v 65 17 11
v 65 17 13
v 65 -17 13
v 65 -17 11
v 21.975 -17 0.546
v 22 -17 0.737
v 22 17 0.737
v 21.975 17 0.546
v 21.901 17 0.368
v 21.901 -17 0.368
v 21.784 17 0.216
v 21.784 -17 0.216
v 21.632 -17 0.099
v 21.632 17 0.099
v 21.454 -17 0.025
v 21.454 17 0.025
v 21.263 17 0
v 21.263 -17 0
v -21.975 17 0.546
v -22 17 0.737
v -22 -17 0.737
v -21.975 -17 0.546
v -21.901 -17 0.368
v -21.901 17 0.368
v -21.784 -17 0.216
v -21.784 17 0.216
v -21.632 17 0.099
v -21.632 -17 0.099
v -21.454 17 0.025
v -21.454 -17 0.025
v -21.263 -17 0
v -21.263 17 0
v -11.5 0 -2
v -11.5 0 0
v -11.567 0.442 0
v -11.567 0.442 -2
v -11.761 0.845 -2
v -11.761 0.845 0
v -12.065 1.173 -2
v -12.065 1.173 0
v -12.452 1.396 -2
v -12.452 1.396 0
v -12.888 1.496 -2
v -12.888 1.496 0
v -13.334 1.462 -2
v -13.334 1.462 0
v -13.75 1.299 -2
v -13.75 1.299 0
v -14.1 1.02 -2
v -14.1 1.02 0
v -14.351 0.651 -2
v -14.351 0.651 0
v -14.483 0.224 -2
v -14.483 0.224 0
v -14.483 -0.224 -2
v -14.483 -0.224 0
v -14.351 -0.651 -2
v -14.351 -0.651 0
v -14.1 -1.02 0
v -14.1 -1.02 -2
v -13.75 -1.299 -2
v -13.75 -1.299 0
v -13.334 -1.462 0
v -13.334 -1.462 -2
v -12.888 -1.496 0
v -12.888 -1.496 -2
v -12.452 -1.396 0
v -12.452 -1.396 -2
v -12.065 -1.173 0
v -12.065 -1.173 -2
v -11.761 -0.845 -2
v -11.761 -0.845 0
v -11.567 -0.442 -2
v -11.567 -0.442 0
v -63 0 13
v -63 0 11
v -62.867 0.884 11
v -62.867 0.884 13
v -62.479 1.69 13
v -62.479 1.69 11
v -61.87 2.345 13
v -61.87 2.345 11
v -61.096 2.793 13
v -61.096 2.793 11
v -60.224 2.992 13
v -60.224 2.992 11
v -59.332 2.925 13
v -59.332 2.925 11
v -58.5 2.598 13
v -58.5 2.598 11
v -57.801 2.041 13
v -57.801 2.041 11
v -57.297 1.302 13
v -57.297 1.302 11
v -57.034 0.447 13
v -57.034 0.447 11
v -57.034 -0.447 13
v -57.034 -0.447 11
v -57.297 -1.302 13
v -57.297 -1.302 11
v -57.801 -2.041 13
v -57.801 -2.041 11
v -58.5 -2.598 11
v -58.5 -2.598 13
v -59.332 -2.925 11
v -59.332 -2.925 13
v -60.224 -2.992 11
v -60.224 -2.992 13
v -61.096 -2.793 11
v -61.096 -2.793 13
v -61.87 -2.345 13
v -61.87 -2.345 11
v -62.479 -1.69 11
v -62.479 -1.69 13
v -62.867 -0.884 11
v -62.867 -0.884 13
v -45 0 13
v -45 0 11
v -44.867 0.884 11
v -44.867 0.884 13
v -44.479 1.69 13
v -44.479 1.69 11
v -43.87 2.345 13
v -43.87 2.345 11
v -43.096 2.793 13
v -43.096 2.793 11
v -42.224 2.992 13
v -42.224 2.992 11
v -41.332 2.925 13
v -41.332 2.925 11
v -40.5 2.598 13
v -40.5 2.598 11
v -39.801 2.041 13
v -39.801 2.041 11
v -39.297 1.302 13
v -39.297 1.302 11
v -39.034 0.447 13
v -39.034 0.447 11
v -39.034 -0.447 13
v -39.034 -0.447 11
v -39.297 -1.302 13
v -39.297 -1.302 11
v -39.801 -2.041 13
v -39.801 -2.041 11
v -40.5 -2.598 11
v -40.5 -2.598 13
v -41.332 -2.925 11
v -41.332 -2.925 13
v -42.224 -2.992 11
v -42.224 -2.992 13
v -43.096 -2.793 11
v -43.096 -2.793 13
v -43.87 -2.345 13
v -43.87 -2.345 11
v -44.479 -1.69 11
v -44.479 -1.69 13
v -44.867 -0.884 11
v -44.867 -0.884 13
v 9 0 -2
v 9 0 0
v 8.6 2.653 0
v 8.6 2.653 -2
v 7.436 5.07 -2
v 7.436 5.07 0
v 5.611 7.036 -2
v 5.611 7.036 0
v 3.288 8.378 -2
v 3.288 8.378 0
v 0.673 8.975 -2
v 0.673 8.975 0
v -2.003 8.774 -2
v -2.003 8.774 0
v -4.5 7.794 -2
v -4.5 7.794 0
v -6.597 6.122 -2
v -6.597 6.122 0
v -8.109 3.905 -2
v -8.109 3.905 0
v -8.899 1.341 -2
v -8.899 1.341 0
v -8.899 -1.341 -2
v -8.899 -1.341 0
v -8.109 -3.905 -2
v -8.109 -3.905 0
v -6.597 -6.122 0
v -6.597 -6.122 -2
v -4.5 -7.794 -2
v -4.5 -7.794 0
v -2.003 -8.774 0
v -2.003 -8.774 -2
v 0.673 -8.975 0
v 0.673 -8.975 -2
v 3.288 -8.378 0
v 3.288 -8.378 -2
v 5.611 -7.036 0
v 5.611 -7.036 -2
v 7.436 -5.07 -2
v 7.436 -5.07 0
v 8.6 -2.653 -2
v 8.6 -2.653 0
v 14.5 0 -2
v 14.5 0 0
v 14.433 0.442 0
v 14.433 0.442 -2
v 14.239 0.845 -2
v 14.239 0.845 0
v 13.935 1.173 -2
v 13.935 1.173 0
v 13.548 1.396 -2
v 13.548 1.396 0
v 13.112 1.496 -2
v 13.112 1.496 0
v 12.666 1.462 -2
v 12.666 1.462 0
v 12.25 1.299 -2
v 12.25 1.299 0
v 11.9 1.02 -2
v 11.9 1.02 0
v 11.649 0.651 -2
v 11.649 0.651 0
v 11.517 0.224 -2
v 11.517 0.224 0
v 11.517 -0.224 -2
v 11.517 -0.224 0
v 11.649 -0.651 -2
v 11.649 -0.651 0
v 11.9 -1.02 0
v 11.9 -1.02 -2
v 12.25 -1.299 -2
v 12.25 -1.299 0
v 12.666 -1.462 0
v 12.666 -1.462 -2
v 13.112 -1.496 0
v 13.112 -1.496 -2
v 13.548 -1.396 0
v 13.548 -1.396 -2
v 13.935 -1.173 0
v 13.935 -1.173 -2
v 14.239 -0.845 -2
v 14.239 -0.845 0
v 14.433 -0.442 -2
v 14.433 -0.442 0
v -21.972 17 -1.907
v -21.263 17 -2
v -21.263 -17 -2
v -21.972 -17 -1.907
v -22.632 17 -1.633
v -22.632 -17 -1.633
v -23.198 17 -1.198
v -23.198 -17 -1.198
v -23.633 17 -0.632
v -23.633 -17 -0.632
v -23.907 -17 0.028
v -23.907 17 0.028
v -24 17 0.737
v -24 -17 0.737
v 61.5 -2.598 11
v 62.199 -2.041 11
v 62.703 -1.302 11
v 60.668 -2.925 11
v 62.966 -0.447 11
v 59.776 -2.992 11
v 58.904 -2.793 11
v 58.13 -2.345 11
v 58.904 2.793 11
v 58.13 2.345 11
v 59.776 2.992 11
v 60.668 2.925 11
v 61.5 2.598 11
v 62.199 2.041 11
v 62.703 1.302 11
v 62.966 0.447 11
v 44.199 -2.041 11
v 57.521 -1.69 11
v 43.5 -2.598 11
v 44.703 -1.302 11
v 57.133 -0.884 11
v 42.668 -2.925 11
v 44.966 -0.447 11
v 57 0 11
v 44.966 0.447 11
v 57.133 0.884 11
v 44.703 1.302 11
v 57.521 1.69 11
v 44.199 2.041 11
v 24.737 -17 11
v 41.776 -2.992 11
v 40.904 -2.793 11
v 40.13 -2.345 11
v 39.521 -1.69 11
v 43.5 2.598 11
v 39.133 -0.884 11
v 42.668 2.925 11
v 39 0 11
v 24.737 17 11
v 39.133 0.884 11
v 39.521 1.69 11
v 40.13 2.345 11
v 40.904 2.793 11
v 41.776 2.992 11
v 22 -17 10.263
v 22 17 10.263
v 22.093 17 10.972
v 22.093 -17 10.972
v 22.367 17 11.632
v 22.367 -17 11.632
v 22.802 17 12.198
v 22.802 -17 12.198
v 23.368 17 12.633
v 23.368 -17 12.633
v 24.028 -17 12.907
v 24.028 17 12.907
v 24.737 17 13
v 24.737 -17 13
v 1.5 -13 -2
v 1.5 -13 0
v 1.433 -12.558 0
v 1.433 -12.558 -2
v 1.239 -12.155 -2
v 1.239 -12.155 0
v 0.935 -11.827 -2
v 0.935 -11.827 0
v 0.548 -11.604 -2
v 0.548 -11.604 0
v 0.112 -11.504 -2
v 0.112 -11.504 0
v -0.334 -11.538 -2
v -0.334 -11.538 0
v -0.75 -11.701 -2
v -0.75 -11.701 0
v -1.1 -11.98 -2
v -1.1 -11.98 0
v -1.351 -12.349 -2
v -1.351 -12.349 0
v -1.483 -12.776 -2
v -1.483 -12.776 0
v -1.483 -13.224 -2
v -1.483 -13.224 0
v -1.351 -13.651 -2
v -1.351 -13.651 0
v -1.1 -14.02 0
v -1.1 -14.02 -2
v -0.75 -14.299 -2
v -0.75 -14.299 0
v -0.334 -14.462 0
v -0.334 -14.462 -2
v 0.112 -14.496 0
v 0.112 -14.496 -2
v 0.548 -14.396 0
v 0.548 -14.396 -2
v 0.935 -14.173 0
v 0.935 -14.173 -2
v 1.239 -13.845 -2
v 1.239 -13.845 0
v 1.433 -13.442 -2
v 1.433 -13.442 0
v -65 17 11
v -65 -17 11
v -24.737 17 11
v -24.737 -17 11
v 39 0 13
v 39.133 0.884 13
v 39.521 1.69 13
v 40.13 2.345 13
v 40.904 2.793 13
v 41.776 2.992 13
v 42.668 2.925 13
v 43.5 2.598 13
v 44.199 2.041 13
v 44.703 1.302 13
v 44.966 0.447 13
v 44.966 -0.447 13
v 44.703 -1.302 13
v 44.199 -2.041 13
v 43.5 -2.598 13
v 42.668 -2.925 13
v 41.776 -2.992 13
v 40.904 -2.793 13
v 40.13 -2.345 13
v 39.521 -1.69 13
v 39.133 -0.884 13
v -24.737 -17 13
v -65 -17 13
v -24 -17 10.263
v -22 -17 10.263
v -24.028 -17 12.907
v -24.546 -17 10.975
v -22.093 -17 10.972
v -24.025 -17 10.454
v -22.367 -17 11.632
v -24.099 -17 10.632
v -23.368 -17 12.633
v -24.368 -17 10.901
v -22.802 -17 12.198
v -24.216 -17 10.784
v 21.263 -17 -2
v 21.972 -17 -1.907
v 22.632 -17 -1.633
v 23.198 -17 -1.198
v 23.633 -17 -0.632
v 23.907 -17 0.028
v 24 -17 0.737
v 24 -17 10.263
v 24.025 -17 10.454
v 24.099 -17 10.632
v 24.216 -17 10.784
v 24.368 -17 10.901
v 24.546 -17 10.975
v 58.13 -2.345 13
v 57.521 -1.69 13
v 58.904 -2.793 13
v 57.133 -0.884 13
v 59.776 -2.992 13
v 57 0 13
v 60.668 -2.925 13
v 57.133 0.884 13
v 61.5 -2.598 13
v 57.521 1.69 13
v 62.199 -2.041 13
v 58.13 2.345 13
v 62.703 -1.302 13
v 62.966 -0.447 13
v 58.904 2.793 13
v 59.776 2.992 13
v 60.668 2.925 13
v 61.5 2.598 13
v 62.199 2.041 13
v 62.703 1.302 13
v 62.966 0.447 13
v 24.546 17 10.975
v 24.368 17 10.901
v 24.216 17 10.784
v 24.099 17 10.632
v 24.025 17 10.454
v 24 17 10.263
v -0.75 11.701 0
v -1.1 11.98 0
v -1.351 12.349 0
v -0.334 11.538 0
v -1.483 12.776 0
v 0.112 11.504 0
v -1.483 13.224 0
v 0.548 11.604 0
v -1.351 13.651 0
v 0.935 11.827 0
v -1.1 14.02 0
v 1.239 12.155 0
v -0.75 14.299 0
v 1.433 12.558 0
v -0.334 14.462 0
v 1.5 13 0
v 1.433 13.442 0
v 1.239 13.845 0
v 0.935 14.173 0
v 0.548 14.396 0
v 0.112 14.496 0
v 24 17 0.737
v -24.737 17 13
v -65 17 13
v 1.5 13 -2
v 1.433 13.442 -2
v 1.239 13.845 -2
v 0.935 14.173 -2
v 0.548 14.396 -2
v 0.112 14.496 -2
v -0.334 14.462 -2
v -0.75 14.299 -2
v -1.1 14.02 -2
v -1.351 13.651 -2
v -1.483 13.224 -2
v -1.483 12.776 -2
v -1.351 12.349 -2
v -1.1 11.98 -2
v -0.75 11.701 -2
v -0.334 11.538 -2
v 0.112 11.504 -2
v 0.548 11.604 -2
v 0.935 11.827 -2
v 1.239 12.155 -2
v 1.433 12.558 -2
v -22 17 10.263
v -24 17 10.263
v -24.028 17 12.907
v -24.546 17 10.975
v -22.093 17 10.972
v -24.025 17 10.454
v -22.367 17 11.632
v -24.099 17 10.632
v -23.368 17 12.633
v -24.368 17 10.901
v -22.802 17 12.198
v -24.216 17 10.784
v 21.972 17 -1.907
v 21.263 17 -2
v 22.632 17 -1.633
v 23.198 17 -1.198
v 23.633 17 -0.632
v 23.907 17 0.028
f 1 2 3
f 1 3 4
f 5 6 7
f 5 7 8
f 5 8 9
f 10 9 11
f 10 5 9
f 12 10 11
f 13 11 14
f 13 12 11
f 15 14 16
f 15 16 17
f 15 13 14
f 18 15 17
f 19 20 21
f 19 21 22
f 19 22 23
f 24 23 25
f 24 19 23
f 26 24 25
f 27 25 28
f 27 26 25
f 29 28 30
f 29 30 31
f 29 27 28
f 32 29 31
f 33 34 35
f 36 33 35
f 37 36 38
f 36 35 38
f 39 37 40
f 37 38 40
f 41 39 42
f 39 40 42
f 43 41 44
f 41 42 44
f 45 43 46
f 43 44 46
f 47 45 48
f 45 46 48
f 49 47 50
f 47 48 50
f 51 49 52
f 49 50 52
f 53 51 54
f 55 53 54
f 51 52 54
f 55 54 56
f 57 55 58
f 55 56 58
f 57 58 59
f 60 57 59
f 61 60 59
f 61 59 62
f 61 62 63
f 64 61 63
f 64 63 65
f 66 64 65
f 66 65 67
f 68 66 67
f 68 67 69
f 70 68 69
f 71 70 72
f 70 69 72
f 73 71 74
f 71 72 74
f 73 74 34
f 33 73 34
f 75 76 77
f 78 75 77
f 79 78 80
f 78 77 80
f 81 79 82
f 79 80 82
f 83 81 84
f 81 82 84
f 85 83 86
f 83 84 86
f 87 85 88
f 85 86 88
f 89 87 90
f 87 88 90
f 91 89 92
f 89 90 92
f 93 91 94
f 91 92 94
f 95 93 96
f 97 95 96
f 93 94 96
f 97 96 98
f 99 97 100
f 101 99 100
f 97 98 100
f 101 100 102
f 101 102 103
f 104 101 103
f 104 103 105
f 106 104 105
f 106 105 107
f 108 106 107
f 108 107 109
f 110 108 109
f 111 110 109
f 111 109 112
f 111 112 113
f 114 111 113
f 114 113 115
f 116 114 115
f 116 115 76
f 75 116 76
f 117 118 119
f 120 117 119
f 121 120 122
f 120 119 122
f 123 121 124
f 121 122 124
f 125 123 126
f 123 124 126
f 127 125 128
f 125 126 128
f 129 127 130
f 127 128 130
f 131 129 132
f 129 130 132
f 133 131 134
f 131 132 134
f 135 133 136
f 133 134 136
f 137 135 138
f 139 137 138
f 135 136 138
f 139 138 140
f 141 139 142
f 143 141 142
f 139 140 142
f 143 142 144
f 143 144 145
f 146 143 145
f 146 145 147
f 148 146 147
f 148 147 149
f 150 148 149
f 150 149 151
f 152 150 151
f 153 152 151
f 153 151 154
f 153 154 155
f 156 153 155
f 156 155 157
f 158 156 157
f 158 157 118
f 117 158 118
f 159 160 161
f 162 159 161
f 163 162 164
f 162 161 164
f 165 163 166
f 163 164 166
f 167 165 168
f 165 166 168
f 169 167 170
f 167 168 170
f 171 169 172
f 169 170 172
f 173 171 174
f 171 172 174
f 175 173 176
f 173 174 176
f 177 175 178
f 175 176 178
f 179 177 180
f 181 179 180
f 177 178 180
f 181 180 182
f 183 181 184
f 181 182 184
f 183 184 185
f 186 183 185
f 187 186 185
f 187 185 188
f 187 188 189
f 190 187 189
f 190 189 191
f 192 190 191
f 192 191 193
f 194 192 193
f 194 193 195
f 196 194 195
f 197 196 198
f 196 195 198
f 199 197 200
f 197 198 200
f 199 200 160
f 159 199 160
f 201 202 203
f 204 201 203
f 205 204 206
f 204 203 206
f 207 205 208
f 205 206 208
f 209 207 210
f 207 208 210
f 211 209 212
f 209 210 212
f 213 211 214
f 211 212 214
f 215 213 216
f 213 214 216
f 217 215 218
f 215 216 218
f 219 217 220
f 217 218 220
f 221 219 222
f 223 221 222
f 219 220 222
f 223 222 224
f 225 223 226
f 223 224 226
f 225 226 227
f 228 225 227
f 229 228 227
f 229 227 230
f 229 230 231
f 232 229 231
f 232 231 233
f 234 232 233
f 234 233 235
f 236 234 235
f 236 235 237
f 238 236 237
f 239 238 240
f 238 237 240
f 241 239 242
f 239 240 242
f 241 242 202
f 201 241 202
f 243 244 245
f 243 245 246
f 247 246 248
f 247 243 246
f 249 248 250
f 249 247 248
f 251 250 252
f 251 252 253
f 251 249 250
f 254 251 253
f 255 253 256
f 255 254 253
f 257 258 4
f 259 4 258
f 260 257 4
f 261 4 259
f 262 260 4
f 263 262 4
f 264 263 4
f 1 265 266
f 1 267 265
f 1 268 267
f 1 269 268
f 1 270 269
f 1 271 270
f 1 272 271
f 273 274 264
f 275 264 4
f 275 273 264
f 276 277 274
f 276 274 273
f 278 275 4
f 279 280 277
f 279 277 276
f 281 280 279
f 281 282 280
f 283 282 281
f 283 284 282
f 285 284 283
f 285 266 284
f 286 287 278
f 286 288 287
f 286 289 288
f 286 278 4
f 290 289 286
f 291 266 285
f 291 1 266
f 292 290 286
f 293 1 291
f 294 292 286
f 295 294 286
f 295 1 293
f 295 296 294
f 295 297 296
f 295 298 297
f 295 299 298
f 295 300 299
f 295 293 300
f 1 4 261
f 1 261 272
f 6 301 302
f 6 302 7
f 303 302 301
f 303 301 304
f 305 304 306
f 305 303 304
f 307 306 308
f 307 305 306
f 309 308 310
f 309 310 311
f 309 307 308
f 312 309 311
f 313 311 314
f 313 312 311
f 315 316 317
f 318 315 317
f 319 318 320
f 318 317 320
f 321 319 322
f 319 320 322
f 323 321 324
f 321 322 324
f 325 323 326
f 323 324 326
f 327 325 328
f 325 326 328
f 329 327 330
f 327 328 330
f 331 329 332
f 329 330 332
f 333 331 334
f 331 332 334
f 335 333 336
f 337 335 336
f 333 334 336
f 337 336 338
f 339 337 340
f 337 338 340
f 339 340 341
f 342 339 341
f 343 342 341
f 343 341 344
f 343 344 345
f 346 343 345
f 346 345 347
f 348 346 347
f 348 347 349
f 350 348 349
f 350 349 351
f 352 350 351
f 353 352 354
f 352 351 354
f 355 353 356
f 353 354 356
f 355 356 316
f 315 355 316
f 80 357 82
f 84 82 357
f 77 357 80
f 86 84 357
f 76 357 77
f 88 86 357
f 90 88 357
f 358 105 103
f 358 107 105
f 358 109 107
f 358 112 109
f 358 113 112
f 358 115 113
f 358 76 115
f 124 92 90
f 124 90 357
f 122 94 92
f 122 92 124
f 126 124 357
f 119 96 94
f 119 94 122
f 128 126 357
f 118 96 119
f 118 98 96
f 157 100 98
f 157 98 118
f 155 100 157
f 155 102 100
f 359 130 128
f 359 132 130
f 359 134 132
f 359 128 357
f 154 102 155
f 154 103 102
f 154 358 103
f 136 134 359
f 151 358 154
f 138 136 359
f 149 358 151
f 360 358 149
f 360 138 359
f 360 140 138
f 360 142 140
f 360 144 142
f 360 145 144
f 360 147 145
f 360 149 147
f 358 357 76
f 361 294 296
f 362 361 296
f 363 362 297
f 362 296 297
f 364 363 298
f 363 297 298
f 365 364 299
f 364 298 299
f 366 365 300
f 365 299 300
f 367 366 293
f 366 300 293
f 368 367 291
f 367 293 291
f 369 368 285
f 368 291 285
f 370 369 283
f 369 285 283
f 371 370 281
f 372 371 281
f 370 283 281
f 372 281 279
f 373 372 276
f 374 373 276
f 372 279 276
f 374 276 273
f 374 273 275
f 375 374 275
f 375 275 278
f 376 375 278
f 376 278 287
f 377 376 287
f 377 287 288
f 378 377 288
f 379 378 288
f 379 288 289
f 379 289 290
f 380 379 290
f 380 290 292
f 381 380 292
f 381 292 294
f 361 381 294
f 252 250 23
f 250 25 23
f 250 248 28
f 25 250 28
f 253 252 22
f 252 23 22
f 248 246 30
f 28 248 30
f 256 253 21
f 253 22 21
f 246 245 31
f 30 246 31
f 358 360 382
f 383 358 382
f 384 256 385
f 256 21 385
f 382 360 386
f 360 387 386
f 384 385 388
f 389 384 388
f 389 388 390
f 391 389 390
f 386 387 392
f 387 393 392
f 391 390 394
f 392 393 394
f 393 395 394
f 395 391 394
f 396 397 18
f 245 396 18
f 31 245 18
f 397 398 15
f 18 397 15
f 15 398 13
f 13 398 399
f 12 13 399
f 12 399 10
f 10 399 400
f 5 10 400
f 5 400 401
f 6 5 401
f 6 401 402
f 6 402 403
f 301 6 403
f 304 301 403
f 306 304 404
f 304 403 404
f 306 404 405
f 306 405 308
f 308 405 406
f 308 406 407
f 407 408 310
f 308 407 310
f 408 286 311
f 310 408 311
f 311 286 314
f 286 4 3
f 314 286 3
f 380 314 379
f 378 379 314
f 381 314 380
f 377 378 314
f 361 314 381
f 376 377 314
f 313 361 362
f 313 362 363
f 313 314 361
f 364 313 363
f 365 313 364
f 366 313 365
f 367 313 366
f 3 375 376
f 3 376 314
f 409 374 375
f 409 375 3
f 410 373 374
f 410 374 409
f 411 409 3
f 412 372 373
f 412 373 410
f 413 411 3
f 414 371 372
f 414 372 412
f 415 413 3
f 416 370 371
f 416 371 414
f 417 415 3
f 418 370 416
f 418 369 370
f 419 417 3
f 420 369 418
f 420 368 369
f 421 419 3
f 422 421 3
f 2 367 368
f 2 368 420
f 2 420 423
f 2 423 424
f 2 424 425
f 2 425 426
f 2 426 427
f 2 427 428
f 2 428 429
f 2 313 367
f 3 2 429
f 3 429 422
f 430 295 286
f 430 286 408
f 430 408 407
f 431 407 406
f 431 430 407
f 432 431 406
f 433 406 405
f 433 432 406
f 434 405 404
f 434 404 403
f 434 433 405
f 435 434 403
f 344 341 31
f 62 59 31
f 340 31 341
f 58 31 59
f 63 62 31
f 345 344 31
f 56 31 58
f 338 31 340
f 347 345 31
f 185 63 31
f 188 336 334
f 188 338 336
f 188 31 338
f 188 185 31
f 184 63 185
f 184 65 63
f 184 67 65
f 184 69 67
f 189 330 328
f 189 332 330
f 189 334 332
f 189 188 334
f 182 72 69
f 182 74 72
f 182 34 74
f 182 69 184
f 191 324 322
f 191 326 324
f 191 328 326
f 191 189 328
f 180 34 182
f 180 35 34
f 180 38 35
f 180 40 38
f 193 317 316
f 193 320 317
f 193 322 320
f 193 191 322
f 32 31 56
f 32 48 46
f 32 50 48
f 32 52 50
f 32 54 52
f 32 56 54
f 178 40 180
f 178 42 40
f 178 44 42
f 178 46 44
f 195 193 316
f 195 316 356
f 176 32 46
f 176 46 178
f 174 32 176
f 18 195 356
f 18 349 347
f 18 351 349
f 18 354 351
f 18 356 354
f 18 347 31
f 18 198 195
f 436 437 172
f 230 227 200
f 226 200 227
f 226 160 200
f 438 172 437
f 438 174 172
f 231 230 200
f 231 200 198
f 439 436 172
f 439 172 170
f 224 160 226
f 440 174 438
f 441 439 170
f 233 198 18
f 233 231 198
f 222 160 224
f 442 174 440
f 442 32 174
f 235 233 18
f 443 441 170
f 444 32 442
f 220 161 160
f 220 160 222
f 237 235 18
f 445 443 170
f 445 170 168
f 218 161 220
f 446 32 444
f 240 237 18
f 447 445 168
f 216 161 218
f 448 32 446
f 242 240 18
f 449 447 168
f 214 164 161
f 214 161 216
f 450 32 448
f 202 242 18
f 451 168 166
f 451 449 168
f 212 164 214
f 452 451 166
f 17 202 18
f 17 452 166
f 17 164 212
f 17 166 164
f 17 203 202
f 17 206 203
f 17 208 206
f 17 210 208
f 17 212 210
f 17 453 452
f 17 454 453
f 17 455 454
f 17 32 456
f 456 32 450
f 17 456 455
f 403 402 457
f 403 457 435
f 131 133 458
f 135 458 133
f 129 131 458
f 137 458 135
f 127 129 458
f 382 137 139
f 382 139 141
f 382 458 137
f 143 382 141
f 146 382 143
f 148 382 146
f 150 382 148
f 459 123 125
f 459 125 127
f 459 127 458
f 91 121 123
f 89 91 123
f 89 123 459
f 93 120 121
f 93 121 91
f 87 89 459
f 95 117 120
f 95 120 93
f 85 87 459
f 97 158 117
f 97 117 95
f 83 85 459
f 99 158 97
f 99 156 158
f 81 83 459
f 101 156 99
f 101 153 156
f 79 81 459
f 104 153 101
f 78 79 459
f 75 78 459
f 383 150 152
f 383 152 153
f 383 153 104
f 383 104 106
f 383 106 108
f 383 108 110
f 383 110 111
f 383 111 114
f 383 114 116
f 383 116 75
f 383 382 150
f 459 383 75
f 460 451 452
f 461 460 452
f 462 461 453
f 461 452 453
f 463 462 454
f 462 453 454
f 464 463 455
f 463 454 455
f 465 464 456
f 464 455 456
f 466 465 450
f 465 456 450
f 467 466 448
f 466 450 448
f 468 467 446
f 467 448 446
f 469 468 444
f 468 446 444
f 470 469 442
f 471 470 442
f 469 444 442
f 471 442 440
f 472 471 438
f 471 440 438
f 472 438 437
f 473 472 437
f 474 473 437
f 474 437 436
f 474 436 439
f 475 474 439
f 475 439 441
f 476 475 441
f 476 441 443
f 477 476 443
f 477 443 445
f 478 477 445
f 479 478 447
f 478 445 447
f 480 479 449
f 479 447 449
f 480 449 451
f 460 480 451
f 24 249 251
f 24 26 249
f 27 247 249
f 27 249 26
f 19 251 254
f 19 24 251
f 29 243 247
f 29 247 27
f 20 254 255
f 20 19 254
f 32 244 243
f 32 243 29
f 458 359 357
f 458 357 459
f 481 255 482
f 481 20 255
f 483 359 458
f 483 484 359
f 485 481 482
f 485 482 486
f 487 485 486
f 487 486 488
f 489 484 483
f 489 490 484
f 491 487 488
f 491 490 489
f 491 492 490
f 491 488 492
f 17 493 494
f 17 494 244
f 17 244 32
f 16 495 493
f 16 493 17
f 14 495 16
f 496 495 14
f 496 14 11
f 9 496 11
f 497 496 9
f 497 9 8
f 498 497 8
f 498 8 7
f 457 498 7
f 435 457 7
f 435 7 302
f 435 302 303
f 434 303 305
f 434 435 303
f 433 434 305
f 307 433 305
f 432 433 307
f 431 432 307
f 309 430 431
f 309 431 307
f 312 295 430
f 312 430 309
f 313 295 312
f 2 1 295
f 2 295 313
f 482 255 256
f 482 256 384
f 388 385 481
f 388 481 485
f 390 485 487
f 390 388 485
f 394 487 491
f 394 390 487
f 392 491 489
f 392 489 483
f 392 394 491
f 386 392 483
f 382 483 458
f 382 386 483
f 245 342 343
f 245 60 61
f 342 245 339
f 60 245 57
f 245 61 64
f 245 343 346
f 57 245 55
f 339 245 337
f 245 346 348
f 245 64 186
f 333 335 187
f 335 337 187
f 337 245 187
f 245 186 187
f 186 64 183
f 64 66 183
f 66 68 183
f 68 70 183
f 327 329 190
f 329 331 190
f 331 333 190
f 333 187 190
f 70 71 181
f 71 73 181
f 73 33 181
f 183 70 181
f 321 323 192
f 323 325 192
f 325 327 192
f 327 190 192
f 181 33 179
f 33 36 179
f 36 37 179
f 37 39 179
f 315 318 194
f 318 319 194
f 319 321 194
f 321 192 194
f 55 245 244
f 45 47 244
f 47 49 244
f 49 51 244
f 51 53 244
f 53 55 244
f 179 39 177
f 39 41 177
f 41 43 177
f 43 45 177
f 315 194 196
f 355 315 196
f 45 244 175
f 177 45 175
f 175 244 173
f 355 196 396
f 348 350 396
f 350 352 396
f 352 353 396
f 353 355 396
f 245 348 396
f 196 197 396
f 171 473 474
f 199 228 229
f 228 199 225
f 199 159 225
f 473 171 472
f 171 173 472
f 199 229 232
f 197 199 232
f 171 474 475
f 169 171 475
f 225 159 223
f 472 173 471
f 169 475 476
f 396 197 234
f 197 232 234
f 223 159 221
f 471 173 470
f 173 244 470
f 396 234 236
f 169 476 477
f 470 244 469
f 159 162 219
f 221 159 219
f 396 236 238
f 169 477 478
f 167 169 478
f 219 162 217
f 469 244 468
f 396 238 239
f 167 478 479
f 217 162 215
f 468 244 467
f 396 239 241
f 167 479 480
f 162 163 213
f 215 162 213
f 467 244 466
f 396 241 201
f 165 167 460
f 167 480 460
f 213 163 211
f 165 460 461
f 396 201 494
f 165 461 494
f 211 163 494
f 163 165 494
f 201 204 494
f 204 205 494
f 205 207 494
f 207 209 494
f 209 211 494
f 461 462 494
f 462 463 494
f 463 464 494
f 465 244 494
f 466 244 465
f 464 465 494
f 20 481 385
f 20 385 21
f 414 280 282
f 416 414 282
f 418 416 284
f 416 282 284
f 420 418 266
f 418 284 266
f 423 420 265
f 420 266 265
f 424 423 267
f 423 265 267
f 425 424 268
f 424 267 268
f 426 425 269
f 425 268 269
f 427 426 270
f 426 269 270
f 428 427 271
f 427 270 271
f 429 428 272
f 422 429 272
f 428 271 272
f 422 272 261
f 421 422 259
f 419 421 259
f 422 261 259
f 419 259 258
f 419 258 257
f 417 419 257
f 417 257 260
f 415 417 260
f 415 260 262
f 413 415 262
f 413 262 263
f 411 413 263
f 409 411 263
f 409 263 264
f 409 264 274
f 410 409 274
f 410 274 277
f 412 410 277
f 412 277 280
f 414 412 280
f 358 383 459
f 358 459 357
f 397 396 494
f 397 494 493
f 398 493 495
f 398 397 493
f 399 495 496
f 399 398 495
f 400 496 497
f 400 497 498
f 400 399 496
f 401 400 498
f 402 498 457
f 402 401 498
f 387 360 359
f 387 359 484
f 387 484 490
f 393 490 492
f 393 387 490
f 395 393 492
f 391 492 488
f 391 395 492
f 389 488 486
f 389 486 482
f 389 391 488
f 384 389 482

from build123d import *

# Parameters (mm, degrees)
SKETCH1_W                      = 44
SKETCH1_H                      = 34
SKETCH1_R                      = 9
SKETCH1_R_2                    = 1.5
BASE_FLANGE1_DEPTH             = 2
EDGE_FLANGE1_STRIP_W           = 9.4732
EDGE_FLANGE1_STRIP_H           = 2
EDGE_FLANGE1_STRIP_CUT_DEPTH   = 34
EDGE_FLANGE1_STRIP_2_W         = 9.4732
EDGE_FLANGE1_STRIP_2_H         = 2
EDGE_FLANGE1_STRIP_CUT_2_DEPTH = 34
EDGE_FLANGE1_DEPTH             = 34
EDGE_FLANGE1_BEND_DEPTH        = 34
EDGE_FLANGE2_STRIP_W           = 9.4732
EDGE_FLANGE2_STRIP_H           = 2
EDGE_FLANGE2_STRIP_CUT_DEPTH   = 34
EDGE_FLANGE2_STRIP_2_W         = 9.4732
EDGE_FLANGE2_STRIP_2_H         = 2
EDGE_FLANGE2_STRIP_CUT_2_DEPTH = 34
EDGE_FLANGE2_DEPTH             = 34
EDGE_FLANGE2_BEND_DEPTH        = 34
SKETCH18_R                     = 3
CUT_EXTRUDE1_DEPTH             = 10


# Sheet-metal steps are written as plain solids
with BuildPart() as part:
    # Sketch1 → Base-Flange1 (new body)
    with BuildSketch(Plane.XY):
        Rectangle(SKETCH1_W, SKETCH1_H)
        Circle(SKETCH1_R, mode=Mode.SUBTRACT)
        with Locations((0, 13)):
            Circle(SKETCH1_R_2, mode=Mode.SUBTRACT)
        with Locations((13, 0)):
            Circle(SKETCH1_R_2, mode=Mode.SUBTRACT)
        with Locations((0, -13)):
            Circle(SKETCH1_R_2, mode=Mode.SUBTRACT)
        with Locations((-13, 0)):
            Circle(SKETCH1_R_2, mode=Mode.SUBTRACT)
    extrude(amount=-BASE_FLANGE1_DEPTH)

    # Edge-Flange1 strip (across the edge) → Edge-Flange1 strip cut (cut)
    with BuildSketch(Plane(origin=(-22, 17, 0), x_dir=(1, 0, 0), z_dir=(0, -1, 0))):
        with Locations((-4, -1)):
            Rectangle(EDGE_FLANGE1_STRIP_W, EDGE_FLANGE1_STRIP_H)
    extrude(amount=EDGE_FLANGE1_STRIP_CUT_DEPTH, mode=Mode.SUBTRACT)

    # Edge-Flange1 strip 2 (across the edge) → Edge-Flange1 strip cut 2 (cut)
    with BuildSketch(Plane(origin=(22, -17, 0), x_dir=(-1, 0, 0), z_dir=(0, 1, 0))):
        with Locations((-4, -1)):
            Rectangle(EDGE_FLANGE1_STRIP_2_W, EDGE_FLANGE1_STRIP_2_H)
    extrude(amount=EDGE_FLANGE1_STRIP_CUT_2_DEPTH, mode=Mode.SUBTRACT)

    # Edge-Flange1 section (across the edge) → Edge-Flange1 (add)
    with BuildSketch(Plane(origin=(-22, 17, 0), x_dir=(1, 0, 0), z_dir=(0, -1, 0))):
        with BuildLine():
            Line((-2, 0.7366), (-2, 11))
            Line((-2, 11), (0, 11))
            Line((0, 11), (0, 0.7366))
            ThreePointArc((0, 0.7366), (0.215745145, 0.215745145), (0.7366, 0))
            Line((0.7366, 0), (0.7366, -2))
            ThreePointArc((0.7366, -2), (-1.198468417, -1.198468417), (-2, 0.7366))
        make_face()
    extrude(amount=EDGE_FLANGE1_DEPTH)

    # Edge-Flange1 section 2 (across the edge) → Edge-Flange1 bend (add)
    with BuildSketch(Plane(origin=(22, -17, 0), x_dir=(-1, 0, 0), z_dir=(0, 1, 0))):
        with BuildLine():
            Line((-2, 0.7366), (-2, 11))
            Line((-2, 11), (0, 11))
            Line((0, 11), (0, 0.7366))
            ThreePointArc((0, 0.7366), (0.215745145, 0.215745145), (0.7366, 0))
            Line((0.7366, 0), (0.7366, -2))
            ThreePointArc((0.7366, -2), (-1.198468417, -1.198468417), (-2, 0.7366))
        make_face()
    extrude(amount=EDGE_FLANGE1_BEND_DEPTH)

    # Edge-Flange2 strip (across the edge) → Edge-Flange2 strip cut (cut)
    with BuildSketch(Plane(origin=(-24, -17, 11), x_dir=(0, 0, -1), z_dir=(0, 1, 0))):
        with Locations((-4, -1)):
            Rectangle(EDGE_FLANGE2_STRIP_W, EDGE_FLANGE2_STRIP_H)
    extrude(amount=EDGE_FLANGE2_STRIP_CUT_DEPTH, mode=Mode.SUBTRACT)

    # Edge-Flange2 strip 2 (across the edge) → Edge-Flange2 strip cut 2 (cut)
    with BuildSketch(Plane(origin=(24, 17, 11), x_dir=(0, 0, -1), z_dir=(0, -1, 0))):
        with Locations((-4, -1)):
            Rectangle(EDGE_FLANGE2_STRIP_2_W, EDGE_FLANGE2_STRIP_2_H)
    extrude(amount=EDGE_FLANGE2_STRIP_CUT_2_DEPTH, mode=Mode.SUBTRACT)

    # Edge-Flange2 section (across the edge) → Edge-Flange2 (add)
    with BuildSketch(Plane(origin=(-24, -17, 11), x_dir=(0, 0, -1), z_dir=(0, 1, 0))):
        with BuildLine():
            Line((-2, 0.7366), (-2, 41))
            Line((-2, 41), (0, 41))
            Line((0, 41), (0, 0.7366))
            ThreePointArc((0, 0.7366), (0.215745145, 0.215745145), (0.7366, 0))
            Line((0.7366, 0), (0.7366, -2))
            ThreePointArc((0.7366, -2), (-1.198468417, -1.198468417), (-2, 0.7366))
        make_face()
    extrude(amount=EDGE_FLANGE2_DEPTH)

    # Edge-Flange2 section 2 (across the edge) → Edge-Flange2 bend (add)
    with BuildSketch(Plane(origin=(24, 17, 11), x_dir=(0, 0, -1), z_dir=(0, -1, 0))):
        with BuildLine():
            Line((-2, 0.7366), (-2, 41))
            Line((-2, 41), (0, 41))
            Line((0, 41), (0, 0.7366))
            ThreePointArc((0, 0.7366), (0.215745145, 0.215745145), (0.7366, 0))
            Line((0.7366, 0), (0.7366, -2))
            ThreePointArc((0.7366, -2), (-1.198468417, -1.198468417), (-2, 0.7366))
        make_face()
    extrude(amount=EDGE_FLANGE2_BEND_DEPTH)

    # Sketch18 → Cut-Extrude1 (cut)
    with BuildSketch(Plane(origin=(0, 0, 11), x_dir=(-1, 0, 0), z_dir=(0, 0, -1))):
        with Locations((60, 0)):
            Circle(SKETCH18_R)
        with Locations((42, 0)):
            Circle(SKETCH18_R)
        with Locations((-60, 0)):
            Circle(SKETCH18_R)
        with Locations((-42, 0)):
            Circle(SKETCH18_R)
    extrude(amount=-CUT_EXTRUDE1_DEPTH, mode=Mode.SUBTRACT)


solid = part.part
